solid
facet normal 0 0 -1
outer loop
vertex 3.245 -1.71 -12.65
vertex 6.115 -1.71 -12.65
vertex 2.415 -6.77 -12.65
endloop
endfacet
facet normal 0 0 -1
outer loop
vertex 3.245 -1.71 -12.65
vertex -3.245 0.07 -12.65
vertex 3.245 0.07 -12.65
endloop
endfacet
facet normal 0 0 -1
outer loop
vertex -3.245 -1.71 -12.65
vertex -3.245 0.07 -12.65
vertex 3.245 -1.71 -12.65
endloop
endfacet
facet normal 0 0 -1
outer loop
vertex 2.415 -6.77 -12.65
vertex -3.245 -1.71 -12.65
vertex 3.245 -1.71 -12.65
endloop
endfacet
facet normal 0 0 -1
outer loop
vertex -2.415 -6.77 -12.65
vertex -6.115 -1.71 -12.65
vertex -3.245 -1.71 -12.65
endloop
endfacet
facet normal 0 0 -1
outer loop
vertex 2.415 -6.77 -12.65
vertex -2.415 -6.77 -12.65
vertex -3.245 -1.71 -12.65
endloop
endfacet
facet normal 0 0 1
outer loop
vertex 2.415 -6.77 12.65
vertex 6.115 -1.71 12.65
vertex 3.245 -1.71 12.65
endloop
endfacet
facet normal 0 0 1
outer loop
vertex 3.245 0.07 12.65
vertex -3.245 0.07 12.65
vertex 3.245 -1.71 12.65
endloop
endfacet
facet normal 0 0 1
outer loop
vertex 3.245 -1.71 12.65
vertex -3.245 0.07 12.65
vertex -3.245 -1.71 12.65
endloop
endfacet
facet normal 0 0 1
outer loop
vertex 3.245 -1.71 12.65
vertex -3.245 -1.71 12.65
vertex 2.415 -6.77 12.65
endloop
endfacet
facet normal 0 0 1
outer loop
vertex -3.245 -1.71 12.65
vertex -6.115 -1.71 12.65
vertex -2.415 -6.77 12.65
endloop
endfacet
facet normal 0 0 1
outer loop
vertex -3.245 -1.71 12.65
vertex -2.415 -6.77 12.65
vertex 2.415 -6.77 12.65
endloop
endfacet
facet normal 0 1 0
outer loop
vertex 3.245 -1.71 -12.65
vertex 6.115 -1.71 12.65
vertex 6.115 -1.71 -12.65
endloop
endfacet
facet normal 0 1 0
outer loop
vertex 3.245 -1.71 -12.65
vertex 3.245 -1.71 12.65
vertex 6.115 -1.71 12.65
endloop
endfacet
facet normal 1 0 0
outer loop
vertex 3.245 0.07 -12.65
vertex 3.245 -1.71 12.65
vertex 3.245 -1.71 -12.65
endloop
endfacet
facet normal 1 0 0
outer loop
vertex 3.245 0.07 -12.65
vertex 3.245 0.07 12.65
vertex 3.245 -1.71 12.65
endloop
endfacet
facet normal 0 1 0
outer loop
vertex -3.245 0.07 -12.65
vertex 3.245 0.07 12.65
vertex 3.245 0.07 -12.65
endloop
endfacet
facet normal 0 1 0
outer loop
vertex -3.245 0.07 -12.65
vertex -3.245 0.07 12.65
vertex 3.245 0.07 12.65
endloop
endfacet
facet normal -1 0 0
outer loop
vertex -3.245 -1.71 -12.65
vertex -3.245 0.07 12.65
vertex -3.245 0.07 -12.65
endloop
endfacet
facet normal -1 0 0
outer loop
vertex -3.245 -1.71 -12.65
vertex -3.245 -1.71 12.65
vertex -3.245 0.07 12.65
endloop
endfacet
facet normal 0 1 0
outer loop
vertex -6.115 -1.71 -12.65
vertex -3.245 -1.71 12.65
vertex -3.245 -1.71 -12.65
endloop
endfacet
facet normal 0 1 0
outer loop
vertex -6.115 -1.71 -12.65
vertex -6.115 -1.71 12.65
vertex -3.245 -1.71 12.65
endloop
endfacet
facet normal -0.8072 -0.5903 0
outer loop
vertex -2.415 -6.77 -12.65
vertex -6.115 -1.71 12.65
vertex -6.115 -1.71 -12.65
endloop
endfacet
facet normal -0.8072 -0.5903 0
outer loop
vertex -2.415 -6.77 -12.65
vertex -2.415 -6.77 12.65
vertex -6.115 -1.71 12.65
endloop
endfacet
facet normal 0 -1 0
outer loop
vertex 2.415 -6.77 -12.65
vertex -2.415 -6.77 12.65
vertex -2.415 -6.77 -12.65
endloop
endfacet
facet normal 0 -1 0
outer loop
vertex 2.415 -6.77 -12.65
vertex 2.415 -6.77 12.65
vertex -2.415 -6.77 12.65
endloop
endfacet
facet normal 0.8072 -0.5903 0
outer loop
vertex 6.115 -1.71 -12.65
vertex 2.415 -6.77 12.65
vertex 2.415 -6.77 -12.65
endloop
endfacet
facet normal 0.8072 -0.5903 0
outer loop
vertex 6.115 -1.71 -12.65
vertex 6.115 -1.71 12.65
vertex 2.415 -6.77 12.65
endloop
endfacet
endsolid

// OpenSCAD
TOL = 0.07;

module extrusionProfileGroovePressFit(length) { 
    gapWidth = 6.63;
    lipWidth = 2.87;
    lipHeight = 1.64;
    sideHeight = 1.21;
    floorWidth = 4.97;
    totalHeight = 6.84;
    
    // X coordinates
    A = gapWidth/2 - TOL;
    B = floorWidth/2 - TOL;
    C = gapWidth/2 + lipWidth - TOL;
    
    // Y coordinates
    D = TOL;
    E = -lipHeight - TOL;
    F = -(lipHeight + sideHeight) + TOL;
    G = -totalHeight + TOL;
    
    linear_extrude(length, center=true)
    polygon([
    [A, D],
    [A, E],
    [C, E],
    [B, G],
    [-B, G],
    [-C, E],
    [-A, E],
    [-A, D],
    ]);
}

extrusionProfileGroovePressFit(length=25.3);
